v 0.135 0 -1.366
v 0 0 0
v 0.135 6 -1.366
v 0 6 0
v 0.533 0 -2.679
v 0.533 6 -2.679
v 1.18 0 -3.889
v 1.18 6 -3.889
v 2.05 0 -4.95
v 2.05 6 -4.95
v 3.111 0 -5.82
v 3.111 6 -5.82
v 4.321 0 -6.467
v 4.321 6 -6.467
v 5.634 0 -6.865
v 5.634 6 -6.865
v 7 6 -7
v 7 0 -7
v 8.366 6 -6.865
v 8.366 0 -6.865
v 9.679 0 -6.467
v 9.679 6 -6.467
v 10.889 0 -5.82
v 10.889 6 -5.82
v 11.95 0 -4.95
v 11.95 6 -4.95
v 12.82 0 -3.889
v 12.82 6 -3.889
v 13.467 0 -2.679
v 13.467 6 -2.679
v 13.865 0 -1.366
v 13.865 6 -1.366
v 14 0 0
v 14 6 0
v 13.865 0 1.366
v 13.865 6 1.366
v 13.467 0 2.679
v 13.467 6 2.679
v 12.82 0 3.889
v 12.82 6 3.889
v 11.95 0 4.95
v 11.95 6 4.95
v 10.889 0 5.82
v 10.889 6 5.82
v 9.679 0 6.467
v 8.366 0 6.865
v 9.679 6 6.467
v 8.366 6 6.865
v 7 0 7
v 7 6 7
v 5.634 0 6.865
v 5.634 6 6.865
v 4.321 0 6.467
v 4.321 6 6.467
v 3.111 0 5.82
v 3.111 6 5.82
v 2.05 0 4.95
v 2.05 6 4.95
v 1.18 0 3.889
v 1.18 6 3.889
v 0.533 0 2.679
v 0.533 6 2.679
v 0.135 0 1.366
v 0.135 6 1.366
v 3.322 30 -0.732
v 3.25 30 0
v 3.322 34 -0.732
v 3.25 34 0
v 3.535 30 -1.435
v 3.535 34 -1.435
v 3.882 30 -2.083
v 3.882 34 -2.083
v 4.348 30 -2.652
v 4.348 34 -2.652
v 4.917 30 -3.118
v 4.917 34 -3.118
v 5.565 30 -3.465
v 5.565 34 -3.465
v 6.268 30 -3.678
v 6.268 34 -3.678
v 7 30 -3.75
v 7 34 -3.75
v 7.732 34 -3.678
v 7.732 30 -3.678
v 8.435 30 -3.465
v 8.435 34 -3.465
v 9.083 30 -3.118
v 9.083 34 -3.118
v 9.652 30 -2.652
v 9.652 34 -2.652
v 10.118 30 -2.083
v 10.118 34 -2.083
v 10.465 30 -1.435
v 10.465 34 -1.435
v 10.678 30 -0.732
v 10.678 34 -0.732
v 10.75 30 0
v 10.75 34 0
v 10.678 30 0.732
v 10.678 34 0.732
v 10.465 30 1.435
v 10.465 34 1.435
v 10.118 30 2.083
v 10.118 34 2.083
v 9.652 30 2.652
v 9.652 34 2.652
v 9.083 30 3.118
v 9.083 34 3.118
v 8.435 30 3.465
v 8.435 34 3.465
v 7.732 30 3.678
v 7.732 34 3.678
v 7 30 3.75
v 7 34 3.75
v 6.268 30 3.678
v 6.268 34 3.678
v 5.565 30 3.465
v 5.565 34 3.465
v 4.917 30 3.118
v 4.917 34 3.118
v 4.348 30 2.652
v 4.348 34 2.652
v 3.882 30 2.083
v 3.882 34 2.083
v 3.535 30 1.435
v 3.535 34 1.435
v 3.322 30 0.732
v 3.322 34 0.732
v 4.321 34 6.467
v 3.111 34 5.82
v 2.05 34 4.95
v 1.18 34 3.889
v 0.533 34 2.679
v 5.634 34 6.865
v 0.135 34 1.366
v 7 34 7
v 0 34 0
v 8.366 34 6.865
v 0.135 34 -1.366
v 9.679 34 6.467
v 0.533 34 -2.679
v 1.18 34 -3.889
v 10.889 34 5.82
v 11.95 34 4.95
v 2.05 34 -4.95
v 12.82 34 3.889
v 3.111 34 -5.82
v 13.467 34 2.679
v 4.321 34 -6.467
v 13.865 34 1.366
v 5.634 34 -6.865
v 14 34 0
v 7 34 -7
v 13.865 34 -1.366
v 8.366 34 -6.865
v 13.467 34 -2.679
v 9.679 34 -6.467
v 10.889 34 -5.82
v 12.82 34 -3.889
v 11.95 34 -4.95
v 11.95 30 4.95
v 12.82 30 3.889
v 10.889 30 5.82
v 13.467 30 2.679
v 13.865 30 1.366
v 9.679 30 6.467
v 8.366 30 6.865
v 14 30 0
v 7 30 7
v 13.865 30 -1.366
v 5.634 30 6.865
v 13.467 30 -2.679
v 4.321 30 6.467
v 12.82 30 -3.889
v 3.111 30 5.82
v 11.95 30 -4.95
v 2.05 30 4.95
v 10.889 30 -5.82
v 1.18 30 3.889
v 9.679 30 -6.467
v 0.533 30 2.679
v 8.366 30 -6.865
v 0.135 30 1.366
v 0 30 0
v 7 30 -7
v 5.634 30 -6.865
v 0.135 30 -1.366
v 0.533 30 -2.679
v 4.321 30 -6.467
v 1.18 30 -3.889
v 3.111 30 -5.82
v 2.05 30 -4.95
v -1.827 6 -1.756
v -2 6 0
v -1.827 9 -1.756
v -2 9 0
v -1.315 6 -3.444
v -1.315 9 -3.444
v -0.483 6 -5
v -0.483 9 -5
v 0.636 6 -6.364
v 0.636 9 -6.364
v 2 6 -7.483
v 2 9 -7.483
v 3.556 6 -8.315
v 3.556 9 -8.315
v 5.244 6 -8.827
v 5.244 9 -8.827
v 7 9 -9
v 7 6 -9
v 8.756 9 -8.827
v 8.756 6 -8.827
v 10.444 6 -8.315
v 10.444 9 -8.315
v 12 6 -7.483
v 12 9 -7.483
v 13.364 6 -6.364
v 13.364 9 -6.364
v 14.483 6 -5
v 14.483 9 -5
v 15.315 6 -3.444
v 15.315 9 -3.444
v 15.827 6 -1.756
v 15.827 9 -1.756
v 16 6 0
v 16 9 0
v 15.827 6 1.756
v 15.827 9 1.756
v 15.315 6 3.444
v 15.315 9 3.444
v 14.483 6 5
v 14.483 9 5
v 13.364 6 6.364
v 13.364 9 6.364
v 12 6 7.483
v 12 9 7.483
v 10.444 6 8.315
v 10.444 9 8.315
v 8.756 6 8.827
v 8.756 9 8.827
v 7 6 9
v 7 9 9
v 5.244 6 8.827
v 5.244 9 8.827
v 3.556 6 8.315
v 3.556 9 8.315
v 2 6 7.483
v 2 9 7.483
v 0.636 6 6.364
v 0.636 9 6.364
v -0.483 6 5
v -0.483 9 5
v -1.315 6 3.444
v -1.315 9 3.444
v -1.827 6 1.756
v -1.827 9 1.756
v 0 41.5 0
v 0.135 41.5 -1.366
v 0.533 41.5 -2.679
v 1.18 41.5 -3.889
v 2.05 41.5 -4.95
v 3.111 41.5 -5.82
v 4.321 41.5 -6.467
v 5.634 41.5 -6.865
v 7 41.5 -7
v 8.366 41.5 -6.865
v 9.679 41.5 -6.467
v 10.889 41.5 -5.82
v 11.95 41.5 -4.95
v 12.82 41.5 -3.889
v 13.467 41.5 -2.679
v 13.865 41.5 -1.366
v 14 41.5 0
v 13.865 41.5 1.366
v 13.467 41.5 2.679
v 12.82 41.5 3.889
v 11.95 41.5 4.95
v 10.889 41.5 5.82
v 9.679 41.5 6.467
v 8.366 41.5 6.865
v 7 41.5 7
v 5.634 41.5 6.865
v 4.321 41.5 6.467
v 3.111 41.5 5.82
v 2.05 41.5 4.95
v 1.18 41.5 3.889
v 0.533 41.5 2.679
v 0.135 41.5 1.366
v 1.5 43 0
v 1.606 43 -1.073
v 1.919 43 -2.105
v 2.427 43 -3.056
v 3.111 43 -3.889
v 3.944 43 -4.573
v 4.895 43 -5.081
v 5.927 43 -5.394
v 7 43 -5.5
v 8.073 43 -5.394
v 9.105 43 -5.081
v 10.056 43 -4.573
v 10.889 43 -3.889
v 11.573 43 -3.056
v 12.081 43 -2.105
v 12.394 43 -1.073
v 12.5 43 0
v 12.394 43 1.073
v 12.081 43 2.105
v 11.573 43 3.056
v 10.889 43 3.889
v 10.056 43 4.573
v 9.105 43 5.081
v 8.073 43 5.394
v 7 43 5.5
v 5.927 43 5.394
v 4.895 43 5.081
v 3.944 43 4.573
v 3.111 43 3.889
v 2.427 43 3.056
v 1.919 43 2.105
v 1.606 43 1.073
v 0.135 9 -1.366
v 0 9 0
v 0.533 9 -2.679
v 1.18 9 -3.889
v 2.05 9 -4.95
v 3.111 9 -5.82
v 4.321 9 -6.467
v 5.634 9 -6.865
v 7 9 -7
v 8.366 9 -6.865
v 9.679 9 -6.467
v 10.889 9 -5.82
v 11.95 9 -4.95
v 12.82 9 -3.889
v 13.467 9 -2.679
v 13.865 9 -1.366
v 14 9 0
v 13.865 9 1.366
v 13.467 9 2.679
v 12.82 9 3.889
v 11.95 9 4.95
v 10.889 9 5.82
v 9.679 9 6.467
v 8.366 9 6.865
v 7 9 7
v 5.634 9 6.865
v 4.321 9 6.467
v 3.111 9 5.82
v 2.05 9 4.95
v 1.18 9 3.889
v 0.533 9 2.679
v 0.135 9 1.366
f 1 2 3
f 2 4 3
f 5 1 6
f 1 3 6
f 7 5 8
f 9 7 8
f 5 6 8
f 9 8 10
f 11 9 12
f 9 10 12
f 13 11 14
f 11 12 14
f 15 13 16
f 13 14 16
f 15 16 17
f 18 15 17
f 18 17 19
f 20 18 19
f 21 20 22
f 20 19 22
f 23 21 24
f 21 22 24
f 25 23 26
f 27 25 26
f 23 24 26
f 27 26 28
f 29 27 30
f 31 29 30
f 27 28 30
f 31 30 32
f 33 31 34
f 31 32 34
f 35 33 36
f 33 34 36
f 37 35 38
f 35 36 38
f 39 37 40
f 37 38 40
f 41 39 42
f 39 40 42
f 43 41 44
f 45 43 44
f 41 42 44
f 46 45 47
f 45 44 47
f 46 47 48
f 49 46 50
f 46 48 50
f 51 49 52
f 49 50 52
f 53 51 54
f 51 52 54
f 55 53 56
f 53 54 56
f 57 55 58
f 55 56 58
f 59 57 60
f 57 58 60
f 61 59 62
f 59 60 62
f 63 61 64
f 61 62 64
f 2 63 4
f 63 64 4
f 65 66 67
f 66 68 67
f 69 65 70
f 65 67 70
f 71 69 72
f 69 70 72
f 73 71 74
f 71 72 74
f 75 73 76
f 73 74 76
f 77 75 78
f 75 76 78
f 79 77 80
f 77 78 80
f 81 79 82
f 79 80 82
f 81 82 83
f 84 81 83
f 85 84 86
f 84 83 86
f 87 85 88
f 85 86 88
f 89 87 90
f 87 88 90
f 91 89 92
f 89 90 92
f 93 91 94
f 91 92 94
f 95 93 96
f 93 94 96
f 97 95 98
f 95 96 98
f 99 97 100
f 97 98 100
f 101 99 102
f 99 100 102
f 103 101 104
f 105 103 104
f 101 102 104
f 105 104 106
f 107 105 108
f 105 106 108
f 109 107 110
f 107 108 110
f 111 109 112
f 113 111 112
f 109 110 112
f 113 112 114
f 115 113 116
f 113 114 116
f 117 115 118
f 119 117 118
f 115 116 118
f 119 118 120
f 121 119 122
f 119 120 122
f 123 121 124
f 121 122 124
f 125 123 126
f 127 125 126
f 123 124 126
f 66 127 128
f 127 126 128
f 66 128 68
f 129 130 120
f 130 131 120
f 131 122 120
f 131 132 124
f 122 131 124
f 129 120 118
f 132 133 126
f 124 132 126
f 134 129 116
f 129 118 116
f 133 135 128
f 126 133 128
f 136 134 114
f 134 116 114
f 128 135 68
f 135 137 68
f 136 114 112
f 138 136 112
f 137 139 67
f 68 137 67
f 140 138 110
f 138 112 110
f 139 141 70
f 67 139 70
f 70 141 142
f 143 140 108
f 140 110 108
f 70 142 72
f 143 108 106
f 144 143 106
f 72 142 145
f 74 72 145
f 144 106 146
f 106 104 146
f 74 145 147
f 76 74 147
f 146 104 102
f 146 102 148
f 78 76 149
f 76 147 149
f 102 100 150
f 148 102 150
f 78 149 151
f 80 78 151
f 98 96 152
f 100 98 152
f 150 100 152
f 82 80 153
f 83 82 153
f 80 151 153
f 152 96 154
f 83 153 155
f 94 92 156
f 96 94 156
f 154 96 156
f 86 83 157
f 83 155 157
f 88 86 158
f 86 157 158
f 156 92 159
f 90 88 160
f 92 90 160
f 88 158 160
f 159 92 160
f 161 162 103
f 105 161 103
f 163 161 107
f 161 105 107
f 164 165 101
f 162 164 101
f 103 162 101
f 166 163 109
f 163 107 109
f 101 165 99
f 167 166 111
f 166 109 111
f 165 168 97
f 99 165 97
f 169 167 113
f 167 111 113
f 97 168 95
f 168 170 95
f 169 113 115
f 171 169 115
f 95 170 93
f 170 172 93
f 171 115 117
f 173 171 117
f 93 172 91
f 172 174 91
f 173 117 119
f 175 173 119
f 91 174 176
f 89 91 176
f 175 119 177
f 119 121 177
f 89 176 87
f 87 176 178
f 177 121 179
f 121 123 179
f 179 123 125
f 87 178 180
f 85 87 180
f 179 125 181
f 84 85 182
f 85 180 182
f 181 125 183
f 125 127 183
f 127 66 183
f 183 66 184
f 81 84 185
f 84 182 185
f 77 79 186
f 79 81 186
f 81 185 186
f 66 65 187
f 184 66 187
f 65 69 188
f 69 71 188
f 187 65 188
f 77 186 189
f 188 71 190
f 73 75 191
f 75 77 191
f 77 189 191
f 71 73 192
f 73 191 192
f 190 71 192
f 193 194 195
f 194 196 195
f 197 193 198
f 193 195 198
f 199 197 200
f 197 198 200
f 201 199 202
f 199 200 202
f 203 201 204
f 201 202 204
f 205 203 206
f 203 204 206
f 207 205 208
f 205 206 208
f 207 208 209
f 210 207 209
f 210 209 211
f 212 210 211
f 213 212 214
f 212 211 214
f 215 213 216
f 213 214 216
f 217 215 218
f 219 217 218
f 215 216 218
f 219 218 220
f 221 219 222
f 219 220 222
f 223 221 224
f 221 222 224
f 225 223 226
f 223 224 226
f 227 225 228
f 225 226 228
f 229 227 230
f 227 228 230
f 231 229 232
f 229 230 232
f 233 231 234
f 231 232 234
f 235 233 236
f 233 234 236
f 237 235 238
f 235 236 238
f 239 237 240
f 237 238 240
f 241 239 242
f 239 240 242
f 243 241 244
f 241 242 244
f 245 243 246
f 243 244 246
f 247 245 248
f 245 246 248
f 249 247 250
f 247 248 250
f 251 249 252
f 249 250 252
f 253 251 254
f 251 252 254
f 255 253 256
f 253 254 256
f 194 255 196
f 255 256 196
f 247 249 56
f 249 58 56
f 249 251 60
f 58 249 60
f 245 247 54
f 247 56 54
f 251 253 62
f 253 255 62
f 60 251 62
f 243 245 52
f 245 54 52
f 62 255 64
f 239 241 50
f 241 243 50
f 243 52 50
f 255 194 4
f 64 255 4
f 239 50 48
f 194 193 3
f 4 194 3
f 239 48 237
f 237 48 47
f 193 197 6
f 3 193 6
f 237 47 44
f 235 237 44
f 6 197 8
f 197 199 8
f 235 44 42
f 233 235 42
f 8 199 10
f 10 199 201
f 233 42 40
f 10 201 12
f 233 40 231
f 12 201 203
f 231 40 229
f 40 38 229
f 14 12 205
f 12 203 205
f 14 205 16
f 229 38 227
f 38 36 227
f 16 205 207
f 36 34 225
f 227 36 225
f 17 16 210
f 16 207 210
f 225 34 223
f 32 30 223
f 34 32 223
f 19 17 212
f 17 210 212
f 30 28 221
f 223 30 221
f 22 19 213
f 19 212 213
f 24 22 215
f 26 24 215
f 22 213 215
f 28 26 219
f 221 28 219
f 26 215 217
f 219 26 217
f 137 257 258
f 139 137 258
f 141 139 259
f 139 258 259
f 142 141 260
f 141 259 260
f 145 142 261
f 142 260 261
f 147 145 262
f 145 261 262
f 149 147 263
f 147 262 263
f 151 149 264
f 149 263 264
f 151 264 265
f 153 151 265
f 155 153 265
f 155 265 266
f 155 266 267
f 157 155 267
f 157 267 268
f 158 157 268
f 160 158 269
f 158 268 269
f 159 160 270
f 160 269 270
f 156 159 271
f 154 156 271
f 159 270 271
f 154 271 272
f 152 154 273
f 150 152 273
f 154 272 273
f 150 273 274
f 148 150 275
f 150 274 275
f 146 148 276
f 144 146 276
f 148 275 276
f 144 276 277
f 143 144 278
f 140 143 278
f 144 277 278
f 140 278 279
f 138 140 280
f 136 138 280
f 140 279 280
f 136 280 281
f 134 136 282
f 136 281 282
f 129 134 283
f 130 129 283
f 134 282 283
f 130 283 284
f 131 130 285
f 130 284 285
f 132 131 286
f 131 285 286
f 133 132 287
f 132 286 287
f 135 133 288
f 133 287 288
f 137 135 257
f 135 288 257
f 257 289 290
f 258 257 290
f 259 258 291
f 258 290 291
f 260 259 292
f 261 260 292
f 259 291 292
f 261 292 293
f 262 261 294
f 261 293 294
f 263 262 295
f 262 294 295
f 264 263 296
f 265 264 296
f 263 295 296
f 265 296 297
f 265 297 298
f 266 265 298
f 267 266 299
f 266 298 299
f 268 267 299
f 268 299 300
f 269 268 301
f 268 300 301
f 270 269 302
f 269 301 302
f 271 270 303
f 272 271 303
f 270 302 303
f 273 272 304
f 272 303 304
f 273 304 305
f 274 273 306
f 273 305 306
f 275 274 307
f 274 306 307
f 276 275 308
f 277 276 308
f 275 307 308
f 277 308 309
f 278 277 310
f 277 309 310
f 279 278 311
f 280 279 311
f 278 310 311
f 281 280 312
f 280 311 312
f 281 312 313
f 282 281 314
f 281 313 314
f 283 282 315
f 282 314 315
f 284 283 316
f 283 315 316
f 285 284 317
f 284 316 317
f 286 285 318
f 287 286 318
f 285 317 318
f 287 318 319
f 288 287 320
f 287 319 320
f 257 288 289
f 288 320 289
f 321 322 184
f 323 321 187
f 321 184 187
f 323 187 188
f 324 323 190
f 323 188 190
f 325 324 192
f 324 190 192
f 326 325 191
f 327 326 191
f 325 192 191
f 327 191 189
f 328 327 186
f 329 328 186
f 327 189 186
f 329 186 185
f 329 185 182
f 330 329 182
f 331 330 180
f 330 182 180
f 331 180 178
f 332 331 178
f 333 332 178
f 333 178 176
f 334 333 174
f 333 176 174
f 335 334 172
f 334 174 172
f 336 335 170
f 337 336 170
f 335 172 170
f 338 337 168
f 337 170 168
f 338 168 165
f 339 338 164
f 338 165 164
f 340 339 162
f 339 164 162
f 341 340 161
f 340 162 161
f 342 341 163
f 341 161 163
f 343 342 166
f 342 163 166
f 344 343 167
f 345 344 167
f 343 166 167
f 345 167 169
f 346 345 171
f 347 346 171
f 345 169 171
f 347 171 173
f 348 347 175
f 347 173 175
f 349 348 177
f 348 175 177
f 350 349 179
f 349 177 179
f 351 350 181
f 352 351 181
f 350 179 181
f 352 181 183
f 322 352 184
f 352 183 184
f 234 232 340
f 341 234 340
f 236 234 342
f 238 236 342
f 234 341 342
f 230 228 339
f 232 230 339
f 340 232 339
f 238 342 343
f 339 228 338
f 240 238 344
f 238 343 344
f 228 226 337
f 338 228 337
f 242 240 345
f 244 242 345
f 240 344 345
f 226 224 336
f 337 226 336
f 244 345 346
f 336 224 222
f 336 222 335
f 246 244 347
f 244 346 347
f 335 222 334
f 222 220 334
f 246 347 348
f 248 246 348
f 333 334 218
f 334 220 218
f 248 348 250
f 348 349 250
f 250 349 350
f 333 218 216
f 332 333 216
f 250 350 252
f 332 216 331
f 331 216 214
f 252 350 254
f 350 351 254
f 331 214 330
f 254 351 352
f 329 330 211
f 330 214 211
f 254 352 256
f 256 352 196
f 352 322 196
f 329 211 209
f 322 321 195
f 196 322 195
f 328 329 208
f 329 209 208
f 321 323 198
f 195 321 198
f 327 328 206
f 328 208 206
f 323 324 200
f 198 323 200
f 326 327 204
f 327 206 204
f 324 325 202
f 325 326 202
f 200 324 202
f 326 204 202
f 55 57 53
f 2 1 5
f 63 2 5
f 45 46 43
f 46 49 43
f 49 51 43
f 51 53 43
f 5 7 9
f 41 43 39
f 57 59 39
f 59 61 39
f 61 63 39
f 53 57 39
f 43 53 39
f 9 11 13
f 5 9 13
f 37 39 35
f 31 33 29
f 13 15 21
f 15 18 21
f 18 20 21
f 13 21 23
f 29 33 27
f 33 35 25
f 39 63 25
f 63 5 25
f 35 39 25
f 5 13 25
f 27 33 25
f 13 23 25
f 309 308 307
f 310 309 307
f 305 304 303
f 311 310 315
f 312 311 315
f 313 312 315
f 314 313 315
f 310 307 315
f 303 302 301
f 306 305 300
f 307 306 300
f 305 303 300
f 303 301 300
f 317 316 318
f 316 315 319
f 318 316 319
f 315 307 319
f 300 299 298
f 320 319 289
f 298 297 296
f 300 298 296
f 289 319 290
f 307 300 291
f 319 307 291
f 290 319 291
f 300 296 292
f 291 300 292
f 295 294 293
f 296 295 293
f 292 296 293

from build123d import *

# Parameters (mm, degrees)
CHAMFER1_SIZE = 1.5


with BuildPart() as part:
    # Sketch1 → Revolve1 (revolve)
    with BuildSketch(Plane.XY):
        Polygon((7, 0), (0, 0), (0, 6), (-2, 6), (-2, 9), (0, 9), (0, 30), (3.25, 30), (3.25, 34), (0, 34), (0, 43), (7, 43), align=None)
    revolve(axis=Axis((7, 43, 0), (0, -1, 0)))

    # Chamfer1
    chamfer1_edges = [part.edges().sort_by_distance(p)[0] for p in [
        (14, 43, 0),
    ]]
    chamfer(chamfer1_edges, length=CHAMFER1_SIZE)


solid = part.part
